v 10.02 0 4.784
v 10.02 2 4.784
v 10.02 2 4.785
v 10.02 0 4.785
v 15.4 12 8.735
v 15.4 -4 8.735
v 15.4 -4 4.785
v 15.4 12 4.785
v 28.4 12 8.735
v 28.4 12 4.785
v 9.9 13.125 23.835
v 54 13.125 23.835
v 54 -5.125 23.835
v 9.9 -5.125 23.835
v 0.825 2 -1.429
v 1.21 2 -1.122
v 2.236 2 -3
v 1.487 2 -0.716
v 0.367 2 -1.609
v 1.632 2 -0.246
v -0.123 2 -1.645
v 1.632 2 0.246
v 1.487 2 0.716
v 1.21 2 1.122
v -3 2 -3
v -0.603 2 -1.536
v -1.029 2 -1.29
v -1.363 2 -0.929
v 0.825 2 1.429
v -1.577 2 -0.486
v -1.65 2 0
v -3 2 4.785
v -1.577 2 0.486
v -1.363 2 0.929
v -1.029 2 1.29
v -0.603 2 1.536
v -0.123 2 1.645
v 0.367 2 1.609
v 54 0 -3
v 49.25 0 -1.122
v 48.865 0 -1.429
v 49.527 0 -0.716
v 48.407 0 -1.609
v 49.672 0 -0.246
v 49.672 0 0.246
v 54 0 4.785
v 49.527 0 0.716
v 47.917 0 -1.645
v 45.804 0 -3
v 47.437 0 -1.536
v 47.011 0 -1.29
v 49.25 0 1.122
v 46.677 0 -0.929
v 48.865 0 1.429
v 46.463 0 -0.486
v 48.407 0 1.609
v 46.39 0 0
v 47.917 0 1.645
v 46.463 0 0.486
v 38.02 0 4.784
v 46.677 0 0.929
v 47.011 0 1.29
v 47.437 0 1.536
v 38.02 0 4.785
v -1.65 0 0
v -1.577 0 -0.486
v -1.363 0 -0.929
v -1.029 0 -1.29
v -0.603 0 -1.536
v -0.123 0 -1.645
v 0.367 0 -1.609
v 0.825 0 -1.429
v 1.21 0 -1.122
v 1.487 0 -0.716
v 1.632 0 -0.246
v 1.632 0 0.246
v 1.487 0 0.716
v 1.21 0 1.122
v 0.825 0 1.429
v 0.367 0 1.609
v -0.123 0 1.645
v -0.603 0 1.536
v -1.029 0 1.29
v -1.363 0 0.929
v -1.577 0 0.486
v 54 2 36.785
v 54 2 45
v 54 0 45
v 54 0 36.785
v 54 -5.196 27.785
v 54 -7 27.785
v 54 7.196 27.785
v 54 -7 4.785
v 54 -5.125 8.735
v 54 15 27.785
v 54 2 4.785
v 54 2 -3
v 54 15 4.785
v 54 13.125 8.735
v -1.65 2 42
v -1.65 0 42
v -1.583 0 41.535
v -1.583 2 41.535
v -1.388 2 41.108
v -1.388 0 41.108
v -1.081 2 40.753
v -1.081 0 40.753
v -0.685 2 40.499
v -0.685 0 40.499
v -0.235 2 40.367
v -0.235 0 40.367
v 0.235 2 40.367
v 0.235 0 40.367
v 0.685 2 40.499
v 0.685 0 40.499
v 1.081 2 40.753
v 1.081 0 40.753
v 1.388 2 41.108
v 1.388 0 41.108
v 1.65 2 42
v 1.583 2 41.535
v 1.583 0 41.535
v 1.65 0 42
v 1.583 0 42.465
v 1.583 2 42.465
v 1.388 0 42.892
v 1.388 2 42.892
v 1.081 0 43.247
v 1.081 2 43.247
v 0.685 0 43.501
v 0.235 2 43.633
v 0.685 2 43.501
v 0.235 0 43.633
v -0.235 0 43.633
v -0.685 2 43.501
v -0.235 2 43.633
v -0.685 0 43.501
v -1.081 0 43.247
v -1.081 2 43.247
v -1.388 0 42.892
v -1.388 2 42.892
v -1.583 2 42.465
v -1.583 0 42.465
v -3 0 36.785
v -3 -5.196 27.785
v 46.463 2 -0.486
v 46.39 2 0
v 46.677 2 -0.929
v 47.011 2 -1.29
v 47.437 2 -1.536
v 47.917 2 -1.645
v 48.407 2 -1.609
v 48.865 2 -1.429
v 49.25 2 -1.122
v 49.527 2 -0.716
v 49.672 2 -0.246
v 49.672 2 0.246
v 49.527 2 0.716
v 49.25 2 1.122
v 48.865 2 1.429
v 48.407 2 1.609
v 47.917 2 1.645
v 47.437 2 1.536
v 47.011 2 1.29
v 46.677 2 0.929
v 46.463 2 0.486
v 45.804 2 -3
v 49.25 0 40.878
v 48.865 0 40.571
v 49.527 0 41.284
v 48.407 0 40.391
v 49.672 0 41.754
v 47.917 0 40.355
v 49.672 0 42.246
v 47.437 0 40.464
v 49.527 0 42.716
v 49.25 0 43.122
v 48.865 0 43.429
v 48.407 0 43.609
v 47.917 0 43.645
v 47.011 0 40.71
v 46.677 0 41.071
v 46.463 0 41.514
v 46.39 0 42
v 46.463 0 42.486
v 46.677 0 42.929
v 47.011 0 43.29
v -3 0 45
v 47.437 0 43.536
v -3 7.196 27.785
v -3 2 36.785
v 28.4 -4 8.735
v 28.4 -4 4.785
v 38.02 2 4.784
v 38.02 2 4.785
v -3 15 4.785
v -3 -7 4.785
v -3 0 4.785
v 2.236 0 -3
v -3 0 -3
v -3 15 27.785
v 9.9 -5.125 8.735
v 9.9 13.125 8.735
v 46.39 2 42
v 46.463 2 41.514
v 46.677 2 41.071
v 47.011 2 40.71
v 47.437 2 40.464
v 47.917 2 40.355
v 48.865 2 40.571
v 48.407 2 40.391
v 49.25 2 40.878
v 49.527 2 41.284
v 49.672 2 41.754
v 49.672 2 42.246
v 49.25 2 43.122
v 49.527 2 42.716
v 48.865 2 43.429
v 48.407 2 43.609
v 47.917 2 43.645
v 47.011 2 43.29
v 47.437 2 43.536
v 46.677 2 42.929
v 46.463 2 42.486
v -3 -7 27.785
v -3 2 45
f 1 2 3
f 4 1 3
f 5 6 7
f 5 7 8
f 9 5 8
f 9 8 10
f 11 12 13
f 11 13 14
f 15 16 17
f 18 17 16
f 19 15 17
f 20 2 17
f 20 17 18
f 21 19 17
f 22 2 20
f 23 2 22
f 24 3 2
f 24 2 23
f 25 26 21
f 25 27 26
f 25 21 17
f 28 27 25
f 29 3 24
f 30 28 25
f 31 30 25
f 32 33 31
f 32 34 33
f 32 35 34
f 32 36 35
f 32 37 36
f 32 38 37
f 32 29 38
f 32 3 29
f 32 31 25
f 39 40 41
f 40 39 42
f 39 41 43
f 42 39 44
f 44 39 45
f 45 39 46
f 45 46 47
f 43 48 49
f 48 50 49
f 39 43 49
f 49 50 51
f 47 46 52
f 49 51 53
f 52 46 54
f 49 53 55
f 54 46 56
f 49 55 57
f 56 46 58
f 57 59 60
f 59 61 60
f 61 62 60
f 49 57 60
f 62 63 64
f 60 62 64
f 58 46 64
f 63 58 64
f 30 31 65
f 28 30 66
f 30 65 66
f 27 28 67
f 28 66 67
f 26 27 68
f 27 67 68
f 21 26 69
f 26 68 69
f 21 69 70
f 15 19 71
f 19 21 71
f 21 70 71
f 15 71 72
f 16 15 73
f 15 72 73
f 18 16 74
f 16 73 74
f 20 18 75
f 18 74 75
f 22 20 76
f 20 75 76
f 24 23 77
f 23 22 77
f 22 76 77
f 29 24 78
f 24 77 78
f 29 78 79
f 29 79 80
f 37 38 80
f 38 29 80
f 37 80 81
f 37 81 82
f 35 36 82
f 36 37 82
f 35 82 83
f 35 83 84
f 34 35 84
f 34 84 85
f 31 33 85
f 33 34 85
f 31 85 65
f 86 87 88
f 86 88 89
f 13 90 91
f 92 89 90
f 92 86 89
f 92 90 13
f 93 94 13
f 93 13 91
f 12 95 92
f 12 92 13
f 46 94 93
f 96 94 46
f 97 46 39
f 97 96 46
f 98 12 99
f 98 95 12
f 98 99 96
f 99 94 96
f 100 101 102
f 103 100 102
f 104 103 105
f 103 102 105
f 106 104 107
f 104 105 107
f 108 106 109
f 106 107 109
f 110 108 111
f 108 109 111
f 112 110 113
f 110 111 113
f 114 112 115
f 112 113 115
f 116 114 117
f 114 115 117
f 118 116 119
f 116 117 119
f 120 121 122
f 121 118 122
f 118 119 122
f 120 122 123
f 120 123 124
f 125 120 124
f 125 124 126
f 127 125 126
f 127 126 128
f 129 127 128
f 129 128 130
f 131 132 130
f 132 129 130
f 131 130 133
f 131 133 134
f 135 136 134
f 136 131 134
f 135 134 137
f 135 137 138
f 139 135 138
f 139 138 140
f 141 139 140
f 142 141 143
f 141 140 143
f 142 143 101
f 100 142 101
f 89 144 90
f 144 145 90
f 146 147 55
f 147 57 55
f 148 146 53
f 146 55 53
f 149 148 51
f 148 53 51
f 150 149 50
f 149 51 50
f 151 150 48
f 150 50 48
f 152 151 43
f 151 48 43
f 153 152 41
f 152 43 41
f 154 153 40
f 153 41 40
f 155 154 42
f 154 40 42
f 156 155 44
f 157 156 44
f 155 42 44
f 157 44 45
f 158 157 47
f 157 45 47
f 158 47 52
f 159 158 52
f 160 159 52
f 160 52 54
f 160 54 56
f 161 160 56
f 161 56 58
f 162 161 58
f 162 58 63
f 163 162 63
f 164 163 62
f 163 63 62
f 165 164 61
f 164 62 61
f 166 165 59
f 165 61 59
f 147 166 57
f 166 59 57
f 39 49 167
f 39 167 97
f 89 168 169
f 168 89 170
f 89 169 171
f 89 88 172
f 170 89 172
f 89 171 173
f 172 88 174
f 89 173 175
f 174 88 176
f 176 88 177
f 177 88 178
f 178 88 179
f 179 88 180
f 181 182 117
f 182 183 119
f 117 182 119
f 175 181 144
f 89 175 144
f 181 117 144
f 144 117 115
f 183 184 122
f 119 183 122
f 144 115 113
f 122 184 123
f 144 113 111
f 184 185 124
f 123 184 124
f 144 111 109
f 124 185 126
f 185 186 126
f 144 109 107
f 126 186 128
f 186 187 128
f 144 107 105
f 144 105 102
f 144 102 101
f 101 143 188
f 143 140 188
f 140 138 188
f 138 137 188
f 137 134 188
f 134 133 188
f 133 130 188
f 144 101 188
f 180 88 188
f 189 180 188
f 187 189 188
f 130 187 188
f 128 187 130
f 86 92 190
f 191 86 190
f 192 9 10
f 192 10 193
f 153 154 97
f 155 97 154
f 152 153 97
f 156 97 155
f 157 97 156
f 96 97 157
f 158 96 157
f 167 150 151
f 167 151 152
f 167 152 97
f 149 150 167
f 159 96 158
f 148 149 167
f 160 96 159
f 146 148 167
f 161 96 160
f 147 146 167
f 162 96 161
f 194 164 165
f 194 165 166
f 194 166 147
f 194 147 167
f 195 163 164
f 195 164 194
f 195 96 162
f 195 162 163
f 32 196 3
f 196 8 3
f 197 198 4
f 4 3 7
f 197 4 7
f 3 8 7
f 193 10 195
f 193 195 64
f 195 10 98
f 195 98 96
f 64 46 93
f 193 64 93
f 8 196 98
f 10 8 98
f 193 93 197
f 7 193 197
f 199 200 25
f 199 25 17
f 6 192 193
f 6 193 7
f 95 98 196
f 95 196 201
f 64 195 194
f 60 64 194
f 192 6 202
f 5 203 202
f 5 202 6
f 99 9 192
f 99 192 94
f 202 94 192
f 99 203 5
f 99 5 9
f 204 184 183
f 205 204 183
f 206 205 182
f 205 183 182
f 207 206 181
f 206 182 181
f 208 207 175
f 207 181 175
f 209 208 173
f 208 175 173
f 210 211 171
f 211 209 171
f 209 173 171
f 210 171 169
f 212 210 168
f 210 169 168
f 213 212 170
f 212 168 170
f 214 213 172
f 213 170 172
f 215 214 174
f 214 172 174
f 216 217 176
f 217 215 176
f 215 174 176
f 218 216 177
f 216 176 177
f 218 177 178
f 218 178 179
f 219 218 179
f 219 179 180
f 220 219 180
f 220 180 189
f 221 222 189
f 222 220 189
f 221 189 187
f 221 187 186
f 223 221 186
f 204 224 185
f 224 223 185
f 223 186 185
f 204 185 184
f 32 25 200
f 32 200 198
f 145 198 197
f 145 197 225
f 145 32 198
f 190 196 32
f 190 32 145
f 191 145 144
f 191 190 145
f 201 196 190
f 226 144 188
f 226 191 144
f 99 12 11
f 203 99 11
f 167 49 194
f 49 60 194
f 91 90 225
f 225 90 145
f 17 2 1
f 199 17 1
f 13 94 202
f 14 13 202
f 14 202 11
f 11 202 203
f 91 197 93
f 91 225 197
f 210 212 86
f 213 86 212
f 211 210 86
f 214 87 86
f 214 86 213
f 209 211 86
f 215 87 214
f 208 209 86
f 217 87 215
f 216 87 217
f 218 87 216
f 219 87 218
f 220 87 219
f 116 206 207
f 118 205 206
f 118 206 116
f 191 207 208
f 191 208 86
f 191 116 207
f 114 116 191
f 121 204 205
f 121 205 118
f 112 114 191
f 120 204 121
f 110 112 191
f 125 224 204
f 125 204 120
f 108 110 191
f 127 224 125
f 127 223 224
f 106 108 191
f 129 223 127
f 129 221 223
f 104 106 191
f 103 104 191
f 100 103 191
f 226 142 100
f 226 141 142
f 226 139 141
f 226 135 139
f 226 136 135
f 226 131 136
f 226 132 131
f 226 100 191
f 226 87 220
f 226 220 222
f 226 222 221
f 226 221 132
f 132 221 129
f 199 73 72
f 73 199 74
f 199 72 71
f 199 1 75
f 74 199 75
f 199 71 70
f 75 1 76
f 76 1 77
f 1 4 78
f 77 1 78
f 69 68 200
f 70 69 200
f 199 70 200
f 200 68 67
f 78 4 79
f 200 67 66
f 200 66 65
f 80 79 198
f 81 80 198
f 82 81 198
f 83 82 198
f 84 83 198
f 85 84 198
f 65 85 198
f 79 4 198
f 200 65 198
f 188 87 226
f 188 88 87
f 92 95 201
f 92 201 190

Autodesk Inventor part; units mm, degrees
ref_plane "YZ Plane" through (0, 0, 0) normal (1, 0, 0) x (0, 1, 0)
ref_plane "XZ Plane" through (0, 0, 0) normal (0, 1, 0) x (-1, 0, 0)
sketch "Sketch1" plane through (0, 0, 0) normal (0, 1, 0) x (-1, 0, 0)
  line L0 (0, 0) -> (3, 0)
  line L1 (3, 0) -> (3, -3)
  line L2 (0, 0) -> (-48.04, 0)
  line L3 (-48.04, 0) -> (-54, 0)
  line L4 (3, -3) -> (-54, -3)
  line L5 (-54, -3) -> (-54, 45)
  line L6 (-54, 45) -> (3, 45)
  line L7 (3, 45) -> (3, -3)
  line L8 (3, 21) -> (6.1215, 21)
  circle A0 centre (0, 0) radius 1.65
  circle A1 centre (-48.04, 0) radius 1.65
  line L9 (0, 42) -> (-48.04, 42)
  circle A2 centre (0, 42) radius 1.65
  circle A3 centre (-48.04, 42) radius 1.65
  line L10 (-54, -3) -> (-54, 8.785)
  line L11 (-54, 8.785) -> (-9.9, 8.785)
  line L12 (-9.9, 8.785) -> (-9.9, 23.785)
  line L13 (-9.9, 23.785) -> (-54, 23.785)
  dimension "d0" = 3
  dimension "d1" = 3
  dimension "d2" = 48.04
  dimension "d3" = 5.96
  dimension "d4" = 48
  dimension "d5" = 3.3
  dimension "d6" = 3.3
  dimension "d7" = 11.785
  dimension "d8" = 44.1
  dimension "d9" = 15
extrude "Extrusion1" add sketch "Sketch1" along normal blind 2 contours A0 L2 A1 L3 L5 L11 L12 L13 L6 L7 L0 | L0 L1 L4 L5 L3 A1 L2 A0
sketch "Sketch2" plane through (0, 0, 0) normal (0, -1, 0) x (1, 0, 0)
  line L0 (-3, -3) -> (-3, 45) projected
  line L1 (-3, -3) -> (-3, 5)
  line L2 (54, 8.785) -> (54, -3) projected
  line L3 (9.9, 8.785) -> (54, 8.785) projected
  line L4 (54, 8.785) -> (54, 4.785)
  line L5 (54, 8.785) -> (54, -3) projected
  line L6 (54, 23.785) -> (54, 27.785)
  line L7 (54, 45) -> (54, 23.785) projected
  line L8 (54, 27.785) -> (-3, 27.785)
  line L9 (-3, 5) -> (-3, 27.785)
  line L10 (9.9, 8.785) -> (54, 8.785) projected
  line L11 (54, 8.785) -> (9.9, 8.785)
  line L12 (9.9, 23.785) -> (9.9, 8.785) projected
  line L13 (9.9, 8.785) -> (9.9, 23.785)
  line L14 (9.9, 23.785) -> (54, 23.785)
  line L15 (-3, 5) -> (-3, 27.785)
  line L16 (-3, 27.785) -> (54, 27.785)
  line L17 (54, 27.785) -> (54, 4.785)
  line L18 (54, 4.785) -> (-3, 4.785)
  line L19 (-3, 4.785) -> (-3, 27.785)
  point P0 (0, 0)
  point P1 (-3, 4.785)
  dimension "d12" = 8
  dimension "d13" = 4
  dimension "d14" = 4
ref_plane "Work Plane1" through (0, -7, 0) normal (0, -1, 0) x (1, 0, 0)
sketch "Sketch4" plane through (54, 0, -3) normal (1, 0, 0) x (0, 0, -1)
  line L0 (-7.785, 0) -> (-7.785, -7) projected
  line L1 (-7.785, 0) -> (-7.785, 2)
  line L2 (0, 2) -> (-48, 2) projected
  line L3 (-7.785, 2) -> (-7.785, 15)
  line L4 (-30.785, 0) -> (-30.785, -7) projected
  line L5 (-30.785, 0) -> (-30.785, 15)
  line L6 (-7.785, 15) -> (-30.785, 15)
  line L7 (-26.785, -5) -> (-11.785, -5) projected
  line L8 (-11.785, 0) -> (-11.785, 2) projected
  line L9 (-11.785, -5) -> (-11.785, 2)
  line L10 (-11.785, 2) -> (-11.785, 13)
  line L11 (-26.785, 0) -> (-26.785, 2) projected
  line L12 (-26.785, 2) -> (-26.785, 13)
  line L13 (-26.785, 13) -> (-11.785, 13)
  point P0 (-3, 0)
  point P1 (-30.785, 2)
  dimension "d19" = 13
  dimension "d20" = 15
  dimension "d21" = 11
  dimension "d22" = 11
extrude "Extrusion5" add sketch "Sketch2" along normal blind 7 contours L0 L8 L6 L14 L12 L3 L2 L18
sketch "Sketch5" plane through (0, -7, 0) normal (0, -1, 0) x (1, 0, 0)
  line L0 (9.9, 23.785) -> (54, 23.785) projected
  line L1 (54, 23.785) -> (9.9, 23.785)
  line L2 (9.9, 23.785) -> (9.9, 8.785)
  line L3 (9.9, 8.785) -> (54, 8.785)
  line L4 (54, 8.785) -> (54, 23.785)
  point P0 (0, 0)
extrude "Extrusion6" add sketch "Sketch5" against normal blind 2
extrude "Extrusion7" add sketch "Sketch4" against normal blind 44.1 contours L2 L10 L13 L12 L5 L6 L3
sketch "Sketch6" plane through (9.9, 0, -3) normal (-1, 0, 0) x (0, 0, 1)
  line L0 (7.785, 15) -> (7.785, 2) projected
  line L1 (48, 2) -> (30.785, 2) projected
  line L2 (7.785, 15) -> (30.785, 15)
  line L3 (30.785, 15) -> (30.785, 2)
  line L4 (30.785, 2) -> (7.785, 2)
  line L5 (7.785, 2) -> (7.785, 15)
  point P0 (3, 0)
extrude "Extrusion8" add sketch "Sketch6" along normal blind 12.9
sketch "Sketch8" plane through (9.9, -5, 8.785) normal (0, 0, 1) x (1, 0, 0)
  line L0 (44.1, 0) -> (44.1, 18) projected
  line L1 (44.1, 0) -> (18.5, 0)
  line L2 (0, 0) -> (44.1, 0) projected
  line L3 (18.5, 0) -> (5.5, 0)
  line L4 (5.5, 0) -> (5.5, 1)
  line L5 (-12.9, 5) -> (44.1, 5) projected
  line L6 (5.5, 1) -> (14.6, 1)
  line L7 (44.1, -2) -> (-12.9, -2) projected
  line L8 (44.1, 18) -> (0, 18) projected
  line L9 (14.6, -2) -> (36.6, -2) construction
  line L10 (5.5, 1) -> (5.5, 18)
  line L11 (5.5, 18) -> (14.6, 18)
  line L12 (44.1, 18) -> (0, 18) projected
  line L13 (5.5, 1) -> (5.5, 17)
  line L14 (5.5, 17) -> (14.6, 17)
  line L15 (5.5, 17) -> (18.5, 17)
  line L16 (18.5, 17) -> (18.5, 1)
  line L17 (18.5, 1) -> (5.5, 1)
  point P0 (-9.9, 5)
  point P1 (5.5, 5)
  point P2 (14.6, 1)
  dimension "d33" = 25.6
  dimension "d34" = 13
  dimension "d35" = 1
  dimension "d39" = 16
  dimension "d42" = 13
extrude "Extrusion10" cut sketch "Sketch8" against normal blind 12.9 contours L16 L17 L6 L10 L5 | L5 L10 L14 L15 L16
sketch "Sketch11" plane through (0, 2, 0) normal (0, 1, 0) x (1, 0, 0)
  circle A0 centre (48.04, 0) radius 1.65 projected
  circle A1 centre (0, 0) radius 1.65 projected
  line L0 (48.04, 0) -> (0, 0)
  line L1 (24.02, 0) -> (24.02, 5.2317)
  line L2 (24.02, 0) -> (10.02, 0)
  line L3 (10.02, 0) -> (38.02, 0)
  line L4 (38.02, 0) -> (38.02, 7.5339)
  line L5 (54, -4.785) -> (-3, -4.785) projected
  line L6 (38.02, 7.5339) -> (10.02, 7.5339)
  line L7 (10.02, 7.5339) -> (10.02, -4.785)
  line L8 (10.02, -4.785) -> (38.02, -4.785)
  line L9 (38.02, -4.785) -> (38.02, 7.5339)
  dimension "d74" = 14
  dimension "d75" = 28
extrude "Extrusion12" cut sketch "Sketch11" against normal blind 10 contours L9 L5 L7 L0 | L0 L7 L6 L4
chamfer "Chamfer9" distance 7.785 angle 45 2 edges at (38.02, 1, -3) (10.02, 1, -3)
sketch "Sketch12" plane through (54, 13, 8.785) normal (0, -1, 0) x (1, 0, 0)
  line L0 (0, 0) -> (-44.1, 0) projected
  line L1 (-44.1, 0) -> (-44.1, 15) projected
  line L2 (0, 0) -> (-44.1, 0)
  line L3 (-44.1, 0) -> (-44.1, 15)
  line L4 (-44.1, 15) -> (0, 15)
  line L5 (0, 15) -> (0, 0)
  point P0 (-54, -8.785)
extrude "Extrusion13" cut sketch "Sketch12" against normal blind 0.125
sketch "Sketch13" plane through (0, -5, 0) normal (0, 1, 0) x (1, 0, 0)
  line L0 (54, -23.785) -> (9.9, -23.785) projected
  line L1 (9.9, -8.785) -> (54, -8.785)
  line L2 (54, -8.785) -> (54, -23.785)
  line L3 (54, -23.785) -> (9.9, -23.785)
  line L4 (9.9, -23.785) -> (9.9, -8.785)
  point P0 (0, 0)
extrude "Extrusion14" cut sketch "Sketch13" against normal blind 0.125
sketch "Sketch14" plane through (54, 13.125, 23.785) normal (0, 0, -1) x (-1, 0, 0)
  line L0 (44.1, -18.25) -> (44.1, 0) projected
  line L1 (0, -18.25) -> (44.1, -18.25) projected
  line L2 (44.1, 0) -> (0, 0)
  line L3 (0, 0) -> (0, -18.25)
  line L4 (0, -18.25) -> (44.1, -18.25)
  line L5 (44.1, -18.25) -> (44.1, 0)
  point P0 (54, -13.125)
extrude "Extrusion15" cut sketch "Sketch14" against normal blind 0.05
sketch "Sketch15" plane through (9.9, 13.125, 8.785) normal (0, 0, 1) x (1, 0, 0)
  line L0 (44.1, 0) -> (0, 0) projected
  line L1 (44.1, 0) -> (44.1, -18.25) projected
  line L2 (0, 0) -> (44.1, 0)
  line L3 (44.1, 0) -> (44.1, -18.25)
  line L4 (44.1, -18.25) -> (0, -18.25)
  line L5 (0, -18.25) -> (0, 0)
  point P0 (-9.9, -13.125)
extrude "Extrusion16" cut sketch "Sketch15" against normal blind 0.05
chamfer "Chamfer12" distance 9 angle 30 1 edges at (25.5, 2, 27.785) measured on face at (32.6017, 2, 32.1586)
chamfer "Chamfer13" distance 9 angle 30 1 edges at (25.5, 0, 27.785) measured on face at (32.6017, 0, 32.1586)
properties part number "U2D2 Plate"
